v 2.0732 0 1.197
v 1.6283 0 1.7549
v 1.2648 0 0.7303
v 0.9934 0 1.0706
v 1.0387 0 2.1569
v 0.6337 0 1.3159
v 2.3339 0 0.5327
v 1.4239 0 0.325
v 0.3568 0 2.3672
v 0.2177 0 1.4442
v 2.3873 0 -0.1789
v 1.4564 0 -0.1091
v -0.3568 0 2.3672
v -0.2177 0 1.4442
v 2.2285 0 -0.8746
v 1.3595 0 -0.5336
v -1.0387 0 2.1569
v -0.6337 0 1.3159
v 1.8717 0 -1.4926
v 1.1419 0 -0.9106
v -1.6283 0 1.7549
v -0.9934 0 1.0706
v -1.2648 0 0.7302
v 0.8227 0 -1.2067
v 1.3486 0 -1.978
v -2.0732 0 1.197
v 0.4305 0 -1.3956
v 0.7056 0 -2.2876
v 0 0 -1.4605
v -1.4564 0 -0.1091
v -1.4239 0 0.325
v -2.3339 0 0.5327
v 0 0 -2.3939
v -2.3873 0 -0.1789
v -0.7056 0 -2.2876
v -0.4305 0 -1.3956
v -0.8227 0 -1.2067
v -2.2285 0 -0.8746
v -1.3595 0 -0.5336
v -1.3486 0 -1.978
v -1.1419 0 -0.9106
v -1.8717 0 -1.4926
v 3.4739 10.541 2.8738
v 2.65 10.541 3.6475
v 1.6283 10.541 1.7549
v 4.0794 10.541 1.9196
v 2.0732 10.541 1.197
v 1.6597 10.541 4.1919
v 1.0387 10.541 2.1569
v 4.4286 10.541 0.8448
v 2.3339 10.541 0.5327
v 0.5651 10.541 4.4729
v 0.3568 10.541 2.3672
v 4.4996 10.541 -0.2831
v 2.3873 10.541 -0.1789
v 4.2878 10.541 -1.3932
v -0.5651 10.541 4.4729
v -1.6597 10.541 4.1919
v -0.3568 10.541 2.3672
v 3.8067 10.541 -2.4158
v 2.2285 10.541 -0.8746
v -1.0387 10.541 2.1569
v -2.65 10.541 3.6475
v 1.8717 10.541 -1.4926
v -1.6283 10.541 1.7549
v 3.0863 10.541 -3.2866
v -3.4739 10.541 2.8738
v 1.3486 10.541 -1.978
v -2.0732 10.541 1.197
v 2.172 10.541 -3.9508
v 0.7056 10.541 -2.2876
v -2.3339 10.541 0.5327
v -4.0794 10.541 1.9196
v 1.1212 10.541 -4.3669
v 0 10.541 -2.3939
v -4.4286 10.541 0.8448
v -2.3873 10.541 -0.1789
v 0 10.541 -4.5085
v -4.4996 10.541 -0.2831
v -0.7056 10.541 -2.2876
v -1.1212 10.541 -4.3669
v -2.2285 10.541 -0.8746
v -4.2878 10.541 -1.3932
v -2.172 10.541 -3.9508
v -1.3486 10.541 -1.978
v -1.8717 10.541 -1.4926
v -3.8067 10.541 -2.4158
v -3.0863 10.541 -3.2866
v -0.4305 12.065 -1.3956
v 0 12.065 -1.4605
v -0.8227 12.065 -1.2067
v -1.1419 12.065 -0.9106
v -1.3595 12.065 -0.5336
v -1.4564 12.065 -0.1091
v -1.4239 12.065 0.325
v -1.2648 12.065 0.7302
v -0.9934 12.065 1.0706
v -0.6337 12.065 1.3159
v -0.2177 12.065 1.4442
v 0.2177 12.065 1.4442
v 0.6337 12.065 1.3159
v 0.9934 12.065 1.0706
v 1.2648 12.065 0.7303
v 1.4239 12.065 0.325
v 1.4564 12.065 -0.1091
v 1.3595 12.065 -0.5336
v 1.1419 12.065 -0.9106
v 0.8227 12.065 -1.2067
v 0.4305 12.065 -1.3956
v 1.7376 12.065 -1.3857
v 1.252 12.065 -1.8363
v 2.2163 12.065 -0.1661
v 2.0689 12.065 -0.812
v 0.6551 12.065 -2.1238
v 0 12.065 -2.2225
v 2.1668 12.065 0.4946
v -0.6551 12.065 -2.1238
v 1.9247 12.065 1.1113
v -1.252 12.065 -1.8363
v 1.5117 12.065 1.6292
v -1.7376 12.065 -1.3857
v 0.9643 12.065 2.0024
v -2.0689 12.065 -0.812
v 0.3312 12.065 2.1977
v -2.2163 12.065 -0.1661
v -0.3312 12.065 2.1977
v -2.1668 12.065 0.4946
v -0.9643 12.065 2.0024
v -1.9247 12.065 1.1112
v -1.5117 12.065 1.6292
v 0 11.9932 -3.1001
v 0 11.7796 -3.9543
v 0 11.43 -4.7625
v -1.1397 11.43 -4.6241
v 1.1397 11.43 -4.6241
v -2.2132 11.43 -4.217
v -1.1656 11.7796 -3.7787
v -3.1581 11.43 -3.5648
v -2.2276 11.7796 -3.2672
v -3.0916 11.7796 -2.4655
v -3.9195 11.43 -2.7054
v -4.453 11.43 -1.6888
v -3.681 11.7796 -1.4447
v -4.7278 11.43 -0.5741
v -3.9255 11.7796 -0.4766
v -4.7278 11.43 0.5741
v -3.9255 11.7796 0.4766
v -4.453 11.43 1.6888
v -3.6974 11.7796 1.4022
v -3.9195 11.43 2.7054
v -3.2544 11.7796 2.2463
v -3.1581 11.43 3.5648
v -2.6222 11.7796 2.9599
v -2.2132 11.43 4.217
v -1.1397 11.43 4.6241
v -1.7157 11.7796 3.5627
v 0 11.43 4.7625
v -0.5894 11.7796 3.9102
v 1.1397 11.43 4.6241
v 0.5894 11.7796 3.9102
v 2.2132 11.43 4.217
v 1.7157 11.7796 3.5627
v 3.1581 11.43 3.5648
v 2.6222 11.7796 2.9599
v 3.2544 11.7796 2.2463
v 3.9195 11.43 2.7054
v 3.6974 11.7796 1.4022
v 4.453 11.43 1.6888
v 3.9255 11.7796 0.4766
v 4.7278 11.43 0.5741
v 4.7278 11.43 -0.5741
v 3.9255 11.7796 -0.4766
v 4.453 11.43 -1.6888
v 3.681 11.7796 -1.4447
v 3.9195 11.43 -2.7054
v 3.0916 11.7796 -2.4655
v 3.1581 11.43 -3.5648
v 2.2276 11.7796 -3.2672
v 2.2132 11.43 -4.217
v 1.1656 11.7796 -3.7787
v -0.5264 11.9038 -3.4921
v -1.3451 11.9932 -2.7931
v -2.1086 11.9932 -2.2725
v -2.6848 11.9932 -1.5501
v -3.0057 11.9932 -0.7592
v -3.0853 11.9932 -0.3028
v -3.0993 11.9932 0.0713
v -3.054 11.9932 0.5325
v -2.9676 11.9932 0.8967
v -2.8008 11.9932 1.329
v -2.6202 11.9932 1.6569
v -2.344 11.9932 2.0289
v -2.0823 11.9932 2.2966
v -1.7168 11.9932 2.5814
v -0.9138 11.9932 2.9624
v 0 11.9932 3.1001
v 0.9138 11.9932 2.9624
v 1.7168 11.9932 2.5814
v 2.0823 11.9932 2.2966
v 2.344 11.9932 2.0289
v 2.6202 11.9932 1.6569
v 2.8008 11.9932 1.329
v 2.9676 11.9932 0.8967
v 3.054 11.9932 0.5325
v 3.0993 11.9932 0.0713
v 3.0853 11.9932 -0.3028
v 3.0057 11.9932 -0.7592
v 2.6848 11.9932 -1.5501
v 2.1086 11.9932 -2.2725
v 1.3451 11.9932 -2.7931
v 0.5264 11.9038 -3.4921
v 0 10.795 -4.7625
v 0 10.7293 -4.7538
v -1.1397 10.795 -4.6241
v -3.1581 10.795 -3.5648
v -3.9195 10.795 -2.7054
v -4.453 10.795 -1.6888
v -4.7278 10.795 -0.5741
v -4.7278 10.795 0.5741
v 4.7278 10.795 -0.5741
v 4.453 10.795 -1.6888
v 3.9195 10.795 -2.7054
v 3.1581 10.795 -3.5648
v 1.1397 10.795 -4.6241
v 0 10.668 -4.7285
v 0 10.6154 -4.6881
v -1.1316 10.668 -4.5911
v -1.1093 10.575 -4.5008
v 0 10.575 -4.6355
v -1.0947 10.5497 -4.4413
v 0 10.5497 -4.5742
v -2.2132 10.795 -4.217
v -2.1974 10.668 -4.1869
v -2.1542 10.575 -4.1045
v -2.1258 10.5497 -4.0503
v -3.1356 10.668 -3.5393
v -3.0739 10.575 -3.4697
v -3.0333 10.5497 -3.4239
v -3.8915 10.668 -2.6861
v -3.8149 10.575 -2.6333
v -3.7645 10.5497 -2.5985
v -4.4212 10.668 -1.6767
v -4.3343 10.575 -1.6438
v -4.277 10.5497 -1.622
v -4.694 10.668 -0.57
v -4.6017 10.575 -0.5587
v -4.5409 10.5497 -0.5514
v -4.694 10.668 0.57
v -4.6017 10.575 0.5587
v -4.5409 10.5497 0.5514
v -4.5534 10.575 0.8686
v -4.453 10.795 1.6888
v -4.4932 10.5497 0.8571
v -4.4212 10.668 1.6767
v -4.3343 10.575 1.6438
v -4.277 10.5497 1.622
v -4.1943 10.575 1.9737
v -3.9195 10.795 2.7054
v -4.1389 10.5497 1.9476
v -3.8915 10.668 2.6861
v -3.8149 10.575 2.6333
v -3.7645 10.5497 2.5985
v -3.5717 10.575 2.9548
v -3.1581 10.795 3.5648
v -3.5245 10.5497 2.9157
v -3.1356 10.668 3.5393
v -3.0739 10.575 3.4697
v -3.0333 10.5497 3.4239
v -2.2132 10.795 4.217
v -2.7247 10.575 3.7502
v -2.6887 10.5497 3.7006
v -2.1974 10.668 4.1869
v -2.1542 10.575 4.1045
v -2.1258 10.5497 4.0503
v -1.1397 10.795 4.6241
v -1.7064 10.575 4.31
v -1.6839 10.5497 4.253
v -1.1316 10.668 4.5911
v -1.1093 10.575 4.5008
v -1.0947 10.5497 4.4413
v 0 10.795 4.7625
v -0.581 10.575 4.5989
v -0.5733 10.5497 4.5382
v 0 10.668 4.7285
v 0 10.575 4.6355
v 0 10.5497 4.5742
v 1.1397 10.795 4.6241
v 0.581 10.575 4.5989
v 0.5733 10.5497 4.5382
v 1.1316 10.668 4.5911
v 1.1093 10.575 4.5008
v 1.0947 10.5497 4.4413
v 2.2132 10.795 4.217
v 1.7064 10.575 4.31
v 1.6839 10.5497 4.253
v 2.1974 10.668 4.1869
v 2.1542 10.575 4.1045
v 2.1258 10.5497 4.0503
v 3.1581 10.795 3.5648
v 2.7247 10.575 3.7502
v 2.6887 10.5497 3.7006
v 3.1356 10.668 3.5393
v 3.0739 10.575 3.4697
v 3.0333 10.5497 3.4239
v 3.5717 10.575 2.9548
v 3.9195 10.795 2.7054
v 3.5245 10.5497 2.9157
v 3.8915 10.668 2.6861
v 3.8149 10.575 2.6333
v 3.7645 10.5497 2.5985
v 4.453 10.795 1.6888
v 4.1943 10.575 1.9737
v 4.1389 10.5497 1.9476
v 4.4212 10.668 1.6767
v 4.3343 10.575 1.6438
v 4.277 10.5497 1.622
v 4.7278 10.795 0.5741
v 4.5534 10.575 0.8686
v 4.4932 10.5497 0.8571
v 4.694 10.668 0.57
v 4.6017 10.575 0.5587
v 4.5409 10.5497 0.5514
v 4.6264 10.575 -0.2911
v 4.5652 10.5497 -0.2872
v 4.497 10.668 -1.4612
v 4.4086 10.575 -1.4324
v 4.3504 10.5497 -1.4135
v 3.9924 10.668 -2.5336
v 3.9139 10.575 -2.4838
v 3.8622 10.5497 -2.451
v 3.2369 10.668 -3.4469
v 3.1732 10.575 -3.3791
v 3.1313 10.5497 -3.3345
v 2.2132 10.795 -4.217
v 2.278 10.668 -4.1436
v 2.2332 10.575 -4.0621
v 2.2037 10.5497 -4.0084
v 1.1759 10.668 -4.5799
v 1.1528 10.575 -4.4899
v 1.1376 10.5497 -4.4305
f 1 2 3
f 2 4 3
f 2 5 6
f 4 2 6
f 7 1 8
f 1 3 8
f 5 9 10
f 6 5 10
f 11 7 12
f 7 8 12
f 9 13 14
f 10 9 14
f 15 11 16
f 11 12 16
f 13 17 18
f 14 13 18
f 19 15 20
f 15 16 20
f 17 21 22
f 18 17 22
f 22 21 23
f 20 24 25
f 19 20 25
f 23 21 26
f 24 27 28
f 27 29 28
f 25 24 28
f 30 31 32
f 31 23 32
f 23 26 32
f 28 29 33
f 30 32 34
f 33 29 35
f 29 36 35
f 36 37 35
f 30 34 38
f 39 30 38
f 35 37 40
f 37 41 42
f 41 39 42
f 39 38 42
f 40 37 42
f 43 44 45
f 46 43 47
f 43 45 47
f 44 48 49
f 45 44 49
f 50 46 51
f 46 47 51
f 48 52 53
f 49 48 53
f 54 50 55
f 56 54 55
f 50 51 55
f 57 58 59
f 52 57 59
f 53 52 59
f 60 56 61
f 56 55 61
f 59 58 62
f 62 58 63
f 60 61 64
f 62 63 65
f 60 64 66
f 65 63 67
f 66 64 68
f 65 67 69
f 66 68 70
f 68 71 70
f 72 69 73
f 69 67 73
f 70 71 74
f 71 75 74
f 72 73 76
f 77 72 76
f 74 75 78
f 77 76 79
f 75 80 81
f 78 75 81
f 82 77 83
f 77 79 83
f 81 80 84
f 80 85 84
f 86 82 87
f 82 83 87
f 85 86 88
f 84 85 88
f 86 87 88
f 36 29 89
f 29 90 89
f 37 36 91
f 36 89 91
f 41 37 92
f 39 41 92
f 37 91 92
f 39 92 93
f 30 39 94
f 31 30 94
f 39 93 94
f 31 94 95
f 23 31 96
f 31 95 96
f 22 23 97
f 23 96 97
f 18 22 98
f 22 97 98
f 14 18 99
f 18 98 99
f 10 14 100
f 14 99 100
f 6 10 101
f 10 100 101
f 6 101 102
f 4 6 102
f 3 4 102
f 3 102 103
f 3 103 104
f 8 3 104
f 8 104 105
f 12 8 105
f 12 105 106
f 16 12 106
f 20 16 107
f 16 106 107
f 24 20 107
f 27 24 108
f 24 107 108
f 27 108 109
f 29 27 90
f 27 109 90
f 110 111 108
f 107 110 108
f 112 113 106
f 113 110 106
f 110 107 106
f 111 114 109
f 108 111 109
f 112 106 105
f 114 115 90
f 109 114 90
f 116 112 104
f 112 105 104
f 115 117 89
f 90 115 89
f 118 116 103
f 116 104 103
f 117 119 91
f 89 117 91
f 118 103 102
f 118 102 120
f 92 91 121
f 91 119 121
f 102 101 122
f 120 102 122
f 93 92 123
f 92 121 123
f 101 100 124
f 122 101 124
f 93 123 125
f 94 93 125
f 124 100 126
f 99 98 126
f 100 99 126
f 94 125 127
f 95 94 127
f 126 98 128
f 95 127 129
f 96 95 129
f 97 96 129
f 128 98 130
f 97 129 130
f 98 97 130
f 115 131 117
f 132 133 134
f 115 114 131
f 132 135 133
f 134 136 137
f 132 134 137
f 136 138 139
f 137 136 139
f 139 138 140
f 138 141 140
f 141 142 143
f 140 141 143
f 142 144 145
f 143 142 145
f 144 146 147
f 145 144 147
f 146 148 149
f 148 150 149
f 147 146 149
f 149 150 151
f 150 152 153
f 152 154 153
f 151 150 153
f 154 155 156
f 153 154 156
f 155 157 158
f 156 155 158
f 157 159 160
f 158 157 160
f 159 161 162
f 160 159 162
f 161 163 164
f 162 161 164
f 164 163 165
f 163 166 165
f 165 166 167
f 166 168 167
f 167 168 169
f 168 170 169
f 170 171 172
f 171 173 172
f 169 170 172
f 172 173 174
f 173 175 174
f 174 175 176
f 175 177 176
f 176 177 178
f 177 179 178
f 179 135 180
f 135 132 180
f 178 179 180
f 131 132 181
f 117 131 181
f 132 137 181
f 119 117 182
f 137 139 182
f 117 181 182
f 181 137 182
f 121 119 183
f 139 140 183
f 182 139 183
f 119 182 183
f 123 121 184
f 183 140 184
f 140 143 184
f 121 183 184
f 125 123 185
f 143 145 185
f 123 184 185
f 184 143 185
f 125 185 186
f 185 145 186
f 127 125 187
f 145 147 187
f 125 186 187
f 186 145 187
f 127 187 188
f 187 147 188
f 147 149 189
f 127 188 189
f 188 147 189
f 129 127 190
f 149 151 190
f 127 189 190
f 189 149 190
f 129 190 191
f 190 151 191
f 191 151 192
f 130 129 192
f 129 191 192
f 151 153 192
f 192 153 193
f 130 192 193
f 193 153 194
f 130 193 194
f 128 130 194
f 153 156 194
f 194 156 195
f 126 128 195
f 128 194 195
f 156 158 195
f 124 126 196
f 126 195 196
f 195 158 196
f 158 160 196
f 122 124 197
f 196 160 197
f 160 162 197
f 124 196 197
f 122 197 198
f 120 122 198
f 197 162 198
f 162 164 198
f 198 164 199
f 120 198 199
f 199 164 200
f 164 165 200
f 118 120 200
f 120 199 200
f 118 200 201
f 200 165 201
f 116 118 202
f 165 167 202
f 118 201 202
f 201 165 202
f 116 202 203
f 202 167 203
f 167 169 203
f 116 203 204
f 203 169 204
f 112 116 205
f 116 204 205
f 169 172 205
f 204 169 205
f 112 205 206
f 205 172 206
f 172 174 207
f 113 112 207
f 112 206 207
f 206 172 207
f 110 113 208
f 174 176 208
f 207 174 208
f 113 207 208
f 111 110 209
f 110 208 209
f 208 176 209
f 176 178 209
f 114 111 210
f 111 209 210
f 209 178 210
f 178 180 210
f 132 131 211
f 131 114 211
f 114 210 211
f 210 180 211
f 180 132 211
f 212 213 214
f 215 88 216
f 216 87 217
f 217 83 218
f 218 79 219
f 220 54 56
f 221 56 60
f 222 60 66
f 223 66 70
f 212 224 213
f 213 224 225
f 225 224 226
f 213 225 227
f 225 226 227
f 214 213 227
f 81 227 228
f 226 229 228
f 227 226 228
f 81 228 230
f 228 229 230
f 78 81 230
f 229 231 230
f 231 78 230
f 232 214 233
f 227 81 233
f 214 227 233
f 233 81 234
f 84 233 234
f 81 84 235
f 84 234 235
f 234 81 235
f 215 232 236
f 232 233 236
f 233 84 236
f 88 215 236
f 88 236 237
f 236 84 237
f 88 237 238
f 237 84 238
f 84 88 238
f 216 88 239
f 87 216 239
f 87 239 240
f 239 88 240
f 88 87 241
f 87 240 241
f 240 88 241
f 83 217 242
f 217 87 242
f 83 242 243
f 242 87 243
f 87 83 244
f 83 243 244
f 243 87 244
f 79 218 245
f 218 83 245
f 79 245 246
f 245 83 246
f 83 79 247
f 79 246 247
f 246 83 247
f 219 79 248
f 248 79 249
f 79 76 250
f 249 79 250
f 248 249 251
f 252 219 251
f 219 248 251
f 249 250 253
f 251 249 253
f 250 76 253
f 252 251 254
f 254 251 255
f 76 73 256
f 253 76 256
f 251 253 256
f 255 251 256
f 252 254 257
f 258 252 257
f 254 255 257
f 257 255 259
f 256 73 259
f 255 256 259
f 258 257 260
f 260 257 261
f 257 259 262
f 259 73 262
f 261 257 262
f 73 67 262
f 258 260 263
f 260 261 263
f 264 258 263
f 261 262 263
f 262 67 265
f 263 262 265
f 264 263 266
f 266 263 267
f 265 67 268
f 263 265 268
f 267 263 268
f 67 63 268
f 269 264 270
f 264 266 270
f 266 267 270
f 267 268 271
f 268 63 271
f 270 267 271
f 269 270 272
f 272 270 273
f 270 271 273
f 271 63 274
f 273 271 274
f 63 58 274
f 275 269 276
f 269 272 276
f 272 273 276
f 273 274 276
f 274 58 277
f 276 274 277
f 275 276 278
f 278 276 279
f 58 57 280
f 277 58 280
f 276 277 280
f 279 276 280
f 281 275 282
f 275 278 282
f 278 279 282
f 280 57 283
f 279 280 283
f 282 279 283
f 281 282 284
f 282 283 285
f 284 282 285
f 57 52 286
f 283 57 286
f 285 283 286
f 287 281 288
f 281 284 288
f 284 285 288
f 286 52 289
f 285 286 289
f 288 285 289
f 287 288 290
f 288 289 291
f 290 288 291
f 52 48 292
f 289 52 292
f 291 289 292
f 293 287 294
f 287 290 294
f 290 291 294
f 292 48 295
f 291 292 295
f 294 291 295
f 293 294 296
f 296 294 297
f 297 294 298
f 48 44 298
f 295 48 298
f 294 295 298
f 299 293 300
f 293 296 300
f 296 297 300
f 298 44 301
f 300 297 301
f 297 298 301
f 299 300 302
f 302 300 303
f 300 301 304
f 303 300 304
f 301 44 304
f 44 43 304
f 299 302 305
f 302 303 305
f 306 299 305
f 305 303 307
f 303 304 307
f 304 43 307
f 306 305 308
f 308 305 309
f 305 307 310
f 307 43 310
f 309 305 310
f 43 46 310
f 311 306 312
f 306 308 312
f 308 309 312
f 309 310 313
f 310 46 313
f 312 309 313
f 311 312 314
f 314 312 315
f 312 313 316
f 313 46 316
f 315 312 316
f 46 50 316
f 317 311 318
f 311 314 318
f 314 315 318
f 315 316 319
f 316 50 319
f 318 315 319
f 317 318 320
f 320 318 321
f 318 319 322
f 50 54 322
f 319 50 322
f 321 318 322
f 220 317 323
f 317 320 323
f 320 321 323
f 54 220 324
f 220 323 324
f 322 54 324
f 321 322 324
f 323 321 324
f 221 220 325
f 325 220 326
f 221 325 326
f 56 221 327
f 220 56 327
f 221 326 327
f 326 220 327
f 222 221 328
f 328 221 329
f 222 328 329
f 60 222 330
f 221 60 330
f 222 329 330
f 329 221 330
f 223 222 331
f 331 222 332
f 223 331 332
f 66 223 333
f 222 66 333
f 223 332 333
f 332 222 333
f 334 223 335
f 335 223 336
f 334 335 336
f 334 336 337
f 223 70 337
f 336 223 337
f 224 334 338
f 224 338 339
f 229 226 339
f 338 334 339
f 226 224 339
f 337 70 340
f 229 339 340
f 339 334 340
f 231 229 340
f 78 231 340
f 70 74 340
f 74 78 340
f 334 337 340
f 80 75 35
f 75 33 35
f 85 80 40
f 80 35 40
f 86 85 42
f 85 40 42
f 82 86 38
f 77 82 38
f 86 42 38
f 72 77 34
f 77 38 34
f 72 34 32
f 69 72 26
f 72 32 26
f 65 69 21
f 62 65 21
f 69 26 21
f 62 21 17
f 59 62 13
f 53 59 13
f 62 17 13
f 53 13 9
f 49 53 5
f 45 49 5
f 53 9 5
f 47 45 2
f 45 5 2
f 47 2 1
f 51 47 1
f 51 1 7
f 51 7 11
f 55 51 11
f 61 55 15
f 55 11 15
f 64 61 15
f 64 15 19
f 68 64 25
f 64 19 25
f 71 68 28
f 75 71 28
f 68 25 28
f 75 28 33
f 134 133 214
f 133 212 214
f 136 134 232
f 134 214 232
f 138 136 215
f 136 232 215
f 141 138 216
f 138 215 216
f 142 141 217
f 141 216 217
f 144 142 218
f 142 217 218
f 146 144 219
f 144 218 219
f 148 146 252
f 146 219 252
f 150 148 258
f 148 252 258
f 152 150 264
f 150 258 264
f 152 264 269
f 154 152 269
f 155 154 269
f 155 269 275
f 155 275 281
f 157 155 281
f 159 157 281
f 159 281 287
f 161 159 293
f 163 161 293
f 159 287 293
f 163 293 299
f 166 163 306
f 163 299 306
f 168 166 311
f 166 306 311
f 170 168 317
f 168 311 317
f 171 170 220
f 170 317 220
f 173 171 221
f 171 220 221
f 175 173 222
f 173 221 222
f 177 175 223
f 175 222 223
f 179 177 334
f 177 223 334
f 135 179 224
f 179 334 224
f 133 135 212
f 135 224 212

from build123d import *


with BuildPart() as part:
    # Sketch1 → Revolve1 (revolve)
    with BuildSketch(Plane.XY, mode=Mode.PRIVATE) as revolve1_sk:
        with BuildLine():
            Line((-1.4605, 0), (-1.4605, 12.065))
            Line((-1.4605, 12.065), (-2.2225, 12.065))
            ThreePointArc((-2.2225, 12.065), (-3.531586036, 11.903844145), (-4.7625, 11.43))
            Line((-4.7625, 11.43), (-4.7625, 10.795))
            ThreePointArc((-4.7625, 10.795), (-4.688105122, 10.615394878), (-4.5085, 10.541))
            Line((-4.5085, 10.541), (-2.39395, 10.541))
            Line((-2.39395, 10.541), (-2.39395, 0))
            Line((-2.39395, 0), (-1.4605, 0))
        make_face()
    revolve(revolve1_sk.sketch.rotate(Axis((0, 0, 0), (0, 1, 0)), 270), axis=Axis((0, 0, 0), (0, 1, 0)))


solid = part.part
